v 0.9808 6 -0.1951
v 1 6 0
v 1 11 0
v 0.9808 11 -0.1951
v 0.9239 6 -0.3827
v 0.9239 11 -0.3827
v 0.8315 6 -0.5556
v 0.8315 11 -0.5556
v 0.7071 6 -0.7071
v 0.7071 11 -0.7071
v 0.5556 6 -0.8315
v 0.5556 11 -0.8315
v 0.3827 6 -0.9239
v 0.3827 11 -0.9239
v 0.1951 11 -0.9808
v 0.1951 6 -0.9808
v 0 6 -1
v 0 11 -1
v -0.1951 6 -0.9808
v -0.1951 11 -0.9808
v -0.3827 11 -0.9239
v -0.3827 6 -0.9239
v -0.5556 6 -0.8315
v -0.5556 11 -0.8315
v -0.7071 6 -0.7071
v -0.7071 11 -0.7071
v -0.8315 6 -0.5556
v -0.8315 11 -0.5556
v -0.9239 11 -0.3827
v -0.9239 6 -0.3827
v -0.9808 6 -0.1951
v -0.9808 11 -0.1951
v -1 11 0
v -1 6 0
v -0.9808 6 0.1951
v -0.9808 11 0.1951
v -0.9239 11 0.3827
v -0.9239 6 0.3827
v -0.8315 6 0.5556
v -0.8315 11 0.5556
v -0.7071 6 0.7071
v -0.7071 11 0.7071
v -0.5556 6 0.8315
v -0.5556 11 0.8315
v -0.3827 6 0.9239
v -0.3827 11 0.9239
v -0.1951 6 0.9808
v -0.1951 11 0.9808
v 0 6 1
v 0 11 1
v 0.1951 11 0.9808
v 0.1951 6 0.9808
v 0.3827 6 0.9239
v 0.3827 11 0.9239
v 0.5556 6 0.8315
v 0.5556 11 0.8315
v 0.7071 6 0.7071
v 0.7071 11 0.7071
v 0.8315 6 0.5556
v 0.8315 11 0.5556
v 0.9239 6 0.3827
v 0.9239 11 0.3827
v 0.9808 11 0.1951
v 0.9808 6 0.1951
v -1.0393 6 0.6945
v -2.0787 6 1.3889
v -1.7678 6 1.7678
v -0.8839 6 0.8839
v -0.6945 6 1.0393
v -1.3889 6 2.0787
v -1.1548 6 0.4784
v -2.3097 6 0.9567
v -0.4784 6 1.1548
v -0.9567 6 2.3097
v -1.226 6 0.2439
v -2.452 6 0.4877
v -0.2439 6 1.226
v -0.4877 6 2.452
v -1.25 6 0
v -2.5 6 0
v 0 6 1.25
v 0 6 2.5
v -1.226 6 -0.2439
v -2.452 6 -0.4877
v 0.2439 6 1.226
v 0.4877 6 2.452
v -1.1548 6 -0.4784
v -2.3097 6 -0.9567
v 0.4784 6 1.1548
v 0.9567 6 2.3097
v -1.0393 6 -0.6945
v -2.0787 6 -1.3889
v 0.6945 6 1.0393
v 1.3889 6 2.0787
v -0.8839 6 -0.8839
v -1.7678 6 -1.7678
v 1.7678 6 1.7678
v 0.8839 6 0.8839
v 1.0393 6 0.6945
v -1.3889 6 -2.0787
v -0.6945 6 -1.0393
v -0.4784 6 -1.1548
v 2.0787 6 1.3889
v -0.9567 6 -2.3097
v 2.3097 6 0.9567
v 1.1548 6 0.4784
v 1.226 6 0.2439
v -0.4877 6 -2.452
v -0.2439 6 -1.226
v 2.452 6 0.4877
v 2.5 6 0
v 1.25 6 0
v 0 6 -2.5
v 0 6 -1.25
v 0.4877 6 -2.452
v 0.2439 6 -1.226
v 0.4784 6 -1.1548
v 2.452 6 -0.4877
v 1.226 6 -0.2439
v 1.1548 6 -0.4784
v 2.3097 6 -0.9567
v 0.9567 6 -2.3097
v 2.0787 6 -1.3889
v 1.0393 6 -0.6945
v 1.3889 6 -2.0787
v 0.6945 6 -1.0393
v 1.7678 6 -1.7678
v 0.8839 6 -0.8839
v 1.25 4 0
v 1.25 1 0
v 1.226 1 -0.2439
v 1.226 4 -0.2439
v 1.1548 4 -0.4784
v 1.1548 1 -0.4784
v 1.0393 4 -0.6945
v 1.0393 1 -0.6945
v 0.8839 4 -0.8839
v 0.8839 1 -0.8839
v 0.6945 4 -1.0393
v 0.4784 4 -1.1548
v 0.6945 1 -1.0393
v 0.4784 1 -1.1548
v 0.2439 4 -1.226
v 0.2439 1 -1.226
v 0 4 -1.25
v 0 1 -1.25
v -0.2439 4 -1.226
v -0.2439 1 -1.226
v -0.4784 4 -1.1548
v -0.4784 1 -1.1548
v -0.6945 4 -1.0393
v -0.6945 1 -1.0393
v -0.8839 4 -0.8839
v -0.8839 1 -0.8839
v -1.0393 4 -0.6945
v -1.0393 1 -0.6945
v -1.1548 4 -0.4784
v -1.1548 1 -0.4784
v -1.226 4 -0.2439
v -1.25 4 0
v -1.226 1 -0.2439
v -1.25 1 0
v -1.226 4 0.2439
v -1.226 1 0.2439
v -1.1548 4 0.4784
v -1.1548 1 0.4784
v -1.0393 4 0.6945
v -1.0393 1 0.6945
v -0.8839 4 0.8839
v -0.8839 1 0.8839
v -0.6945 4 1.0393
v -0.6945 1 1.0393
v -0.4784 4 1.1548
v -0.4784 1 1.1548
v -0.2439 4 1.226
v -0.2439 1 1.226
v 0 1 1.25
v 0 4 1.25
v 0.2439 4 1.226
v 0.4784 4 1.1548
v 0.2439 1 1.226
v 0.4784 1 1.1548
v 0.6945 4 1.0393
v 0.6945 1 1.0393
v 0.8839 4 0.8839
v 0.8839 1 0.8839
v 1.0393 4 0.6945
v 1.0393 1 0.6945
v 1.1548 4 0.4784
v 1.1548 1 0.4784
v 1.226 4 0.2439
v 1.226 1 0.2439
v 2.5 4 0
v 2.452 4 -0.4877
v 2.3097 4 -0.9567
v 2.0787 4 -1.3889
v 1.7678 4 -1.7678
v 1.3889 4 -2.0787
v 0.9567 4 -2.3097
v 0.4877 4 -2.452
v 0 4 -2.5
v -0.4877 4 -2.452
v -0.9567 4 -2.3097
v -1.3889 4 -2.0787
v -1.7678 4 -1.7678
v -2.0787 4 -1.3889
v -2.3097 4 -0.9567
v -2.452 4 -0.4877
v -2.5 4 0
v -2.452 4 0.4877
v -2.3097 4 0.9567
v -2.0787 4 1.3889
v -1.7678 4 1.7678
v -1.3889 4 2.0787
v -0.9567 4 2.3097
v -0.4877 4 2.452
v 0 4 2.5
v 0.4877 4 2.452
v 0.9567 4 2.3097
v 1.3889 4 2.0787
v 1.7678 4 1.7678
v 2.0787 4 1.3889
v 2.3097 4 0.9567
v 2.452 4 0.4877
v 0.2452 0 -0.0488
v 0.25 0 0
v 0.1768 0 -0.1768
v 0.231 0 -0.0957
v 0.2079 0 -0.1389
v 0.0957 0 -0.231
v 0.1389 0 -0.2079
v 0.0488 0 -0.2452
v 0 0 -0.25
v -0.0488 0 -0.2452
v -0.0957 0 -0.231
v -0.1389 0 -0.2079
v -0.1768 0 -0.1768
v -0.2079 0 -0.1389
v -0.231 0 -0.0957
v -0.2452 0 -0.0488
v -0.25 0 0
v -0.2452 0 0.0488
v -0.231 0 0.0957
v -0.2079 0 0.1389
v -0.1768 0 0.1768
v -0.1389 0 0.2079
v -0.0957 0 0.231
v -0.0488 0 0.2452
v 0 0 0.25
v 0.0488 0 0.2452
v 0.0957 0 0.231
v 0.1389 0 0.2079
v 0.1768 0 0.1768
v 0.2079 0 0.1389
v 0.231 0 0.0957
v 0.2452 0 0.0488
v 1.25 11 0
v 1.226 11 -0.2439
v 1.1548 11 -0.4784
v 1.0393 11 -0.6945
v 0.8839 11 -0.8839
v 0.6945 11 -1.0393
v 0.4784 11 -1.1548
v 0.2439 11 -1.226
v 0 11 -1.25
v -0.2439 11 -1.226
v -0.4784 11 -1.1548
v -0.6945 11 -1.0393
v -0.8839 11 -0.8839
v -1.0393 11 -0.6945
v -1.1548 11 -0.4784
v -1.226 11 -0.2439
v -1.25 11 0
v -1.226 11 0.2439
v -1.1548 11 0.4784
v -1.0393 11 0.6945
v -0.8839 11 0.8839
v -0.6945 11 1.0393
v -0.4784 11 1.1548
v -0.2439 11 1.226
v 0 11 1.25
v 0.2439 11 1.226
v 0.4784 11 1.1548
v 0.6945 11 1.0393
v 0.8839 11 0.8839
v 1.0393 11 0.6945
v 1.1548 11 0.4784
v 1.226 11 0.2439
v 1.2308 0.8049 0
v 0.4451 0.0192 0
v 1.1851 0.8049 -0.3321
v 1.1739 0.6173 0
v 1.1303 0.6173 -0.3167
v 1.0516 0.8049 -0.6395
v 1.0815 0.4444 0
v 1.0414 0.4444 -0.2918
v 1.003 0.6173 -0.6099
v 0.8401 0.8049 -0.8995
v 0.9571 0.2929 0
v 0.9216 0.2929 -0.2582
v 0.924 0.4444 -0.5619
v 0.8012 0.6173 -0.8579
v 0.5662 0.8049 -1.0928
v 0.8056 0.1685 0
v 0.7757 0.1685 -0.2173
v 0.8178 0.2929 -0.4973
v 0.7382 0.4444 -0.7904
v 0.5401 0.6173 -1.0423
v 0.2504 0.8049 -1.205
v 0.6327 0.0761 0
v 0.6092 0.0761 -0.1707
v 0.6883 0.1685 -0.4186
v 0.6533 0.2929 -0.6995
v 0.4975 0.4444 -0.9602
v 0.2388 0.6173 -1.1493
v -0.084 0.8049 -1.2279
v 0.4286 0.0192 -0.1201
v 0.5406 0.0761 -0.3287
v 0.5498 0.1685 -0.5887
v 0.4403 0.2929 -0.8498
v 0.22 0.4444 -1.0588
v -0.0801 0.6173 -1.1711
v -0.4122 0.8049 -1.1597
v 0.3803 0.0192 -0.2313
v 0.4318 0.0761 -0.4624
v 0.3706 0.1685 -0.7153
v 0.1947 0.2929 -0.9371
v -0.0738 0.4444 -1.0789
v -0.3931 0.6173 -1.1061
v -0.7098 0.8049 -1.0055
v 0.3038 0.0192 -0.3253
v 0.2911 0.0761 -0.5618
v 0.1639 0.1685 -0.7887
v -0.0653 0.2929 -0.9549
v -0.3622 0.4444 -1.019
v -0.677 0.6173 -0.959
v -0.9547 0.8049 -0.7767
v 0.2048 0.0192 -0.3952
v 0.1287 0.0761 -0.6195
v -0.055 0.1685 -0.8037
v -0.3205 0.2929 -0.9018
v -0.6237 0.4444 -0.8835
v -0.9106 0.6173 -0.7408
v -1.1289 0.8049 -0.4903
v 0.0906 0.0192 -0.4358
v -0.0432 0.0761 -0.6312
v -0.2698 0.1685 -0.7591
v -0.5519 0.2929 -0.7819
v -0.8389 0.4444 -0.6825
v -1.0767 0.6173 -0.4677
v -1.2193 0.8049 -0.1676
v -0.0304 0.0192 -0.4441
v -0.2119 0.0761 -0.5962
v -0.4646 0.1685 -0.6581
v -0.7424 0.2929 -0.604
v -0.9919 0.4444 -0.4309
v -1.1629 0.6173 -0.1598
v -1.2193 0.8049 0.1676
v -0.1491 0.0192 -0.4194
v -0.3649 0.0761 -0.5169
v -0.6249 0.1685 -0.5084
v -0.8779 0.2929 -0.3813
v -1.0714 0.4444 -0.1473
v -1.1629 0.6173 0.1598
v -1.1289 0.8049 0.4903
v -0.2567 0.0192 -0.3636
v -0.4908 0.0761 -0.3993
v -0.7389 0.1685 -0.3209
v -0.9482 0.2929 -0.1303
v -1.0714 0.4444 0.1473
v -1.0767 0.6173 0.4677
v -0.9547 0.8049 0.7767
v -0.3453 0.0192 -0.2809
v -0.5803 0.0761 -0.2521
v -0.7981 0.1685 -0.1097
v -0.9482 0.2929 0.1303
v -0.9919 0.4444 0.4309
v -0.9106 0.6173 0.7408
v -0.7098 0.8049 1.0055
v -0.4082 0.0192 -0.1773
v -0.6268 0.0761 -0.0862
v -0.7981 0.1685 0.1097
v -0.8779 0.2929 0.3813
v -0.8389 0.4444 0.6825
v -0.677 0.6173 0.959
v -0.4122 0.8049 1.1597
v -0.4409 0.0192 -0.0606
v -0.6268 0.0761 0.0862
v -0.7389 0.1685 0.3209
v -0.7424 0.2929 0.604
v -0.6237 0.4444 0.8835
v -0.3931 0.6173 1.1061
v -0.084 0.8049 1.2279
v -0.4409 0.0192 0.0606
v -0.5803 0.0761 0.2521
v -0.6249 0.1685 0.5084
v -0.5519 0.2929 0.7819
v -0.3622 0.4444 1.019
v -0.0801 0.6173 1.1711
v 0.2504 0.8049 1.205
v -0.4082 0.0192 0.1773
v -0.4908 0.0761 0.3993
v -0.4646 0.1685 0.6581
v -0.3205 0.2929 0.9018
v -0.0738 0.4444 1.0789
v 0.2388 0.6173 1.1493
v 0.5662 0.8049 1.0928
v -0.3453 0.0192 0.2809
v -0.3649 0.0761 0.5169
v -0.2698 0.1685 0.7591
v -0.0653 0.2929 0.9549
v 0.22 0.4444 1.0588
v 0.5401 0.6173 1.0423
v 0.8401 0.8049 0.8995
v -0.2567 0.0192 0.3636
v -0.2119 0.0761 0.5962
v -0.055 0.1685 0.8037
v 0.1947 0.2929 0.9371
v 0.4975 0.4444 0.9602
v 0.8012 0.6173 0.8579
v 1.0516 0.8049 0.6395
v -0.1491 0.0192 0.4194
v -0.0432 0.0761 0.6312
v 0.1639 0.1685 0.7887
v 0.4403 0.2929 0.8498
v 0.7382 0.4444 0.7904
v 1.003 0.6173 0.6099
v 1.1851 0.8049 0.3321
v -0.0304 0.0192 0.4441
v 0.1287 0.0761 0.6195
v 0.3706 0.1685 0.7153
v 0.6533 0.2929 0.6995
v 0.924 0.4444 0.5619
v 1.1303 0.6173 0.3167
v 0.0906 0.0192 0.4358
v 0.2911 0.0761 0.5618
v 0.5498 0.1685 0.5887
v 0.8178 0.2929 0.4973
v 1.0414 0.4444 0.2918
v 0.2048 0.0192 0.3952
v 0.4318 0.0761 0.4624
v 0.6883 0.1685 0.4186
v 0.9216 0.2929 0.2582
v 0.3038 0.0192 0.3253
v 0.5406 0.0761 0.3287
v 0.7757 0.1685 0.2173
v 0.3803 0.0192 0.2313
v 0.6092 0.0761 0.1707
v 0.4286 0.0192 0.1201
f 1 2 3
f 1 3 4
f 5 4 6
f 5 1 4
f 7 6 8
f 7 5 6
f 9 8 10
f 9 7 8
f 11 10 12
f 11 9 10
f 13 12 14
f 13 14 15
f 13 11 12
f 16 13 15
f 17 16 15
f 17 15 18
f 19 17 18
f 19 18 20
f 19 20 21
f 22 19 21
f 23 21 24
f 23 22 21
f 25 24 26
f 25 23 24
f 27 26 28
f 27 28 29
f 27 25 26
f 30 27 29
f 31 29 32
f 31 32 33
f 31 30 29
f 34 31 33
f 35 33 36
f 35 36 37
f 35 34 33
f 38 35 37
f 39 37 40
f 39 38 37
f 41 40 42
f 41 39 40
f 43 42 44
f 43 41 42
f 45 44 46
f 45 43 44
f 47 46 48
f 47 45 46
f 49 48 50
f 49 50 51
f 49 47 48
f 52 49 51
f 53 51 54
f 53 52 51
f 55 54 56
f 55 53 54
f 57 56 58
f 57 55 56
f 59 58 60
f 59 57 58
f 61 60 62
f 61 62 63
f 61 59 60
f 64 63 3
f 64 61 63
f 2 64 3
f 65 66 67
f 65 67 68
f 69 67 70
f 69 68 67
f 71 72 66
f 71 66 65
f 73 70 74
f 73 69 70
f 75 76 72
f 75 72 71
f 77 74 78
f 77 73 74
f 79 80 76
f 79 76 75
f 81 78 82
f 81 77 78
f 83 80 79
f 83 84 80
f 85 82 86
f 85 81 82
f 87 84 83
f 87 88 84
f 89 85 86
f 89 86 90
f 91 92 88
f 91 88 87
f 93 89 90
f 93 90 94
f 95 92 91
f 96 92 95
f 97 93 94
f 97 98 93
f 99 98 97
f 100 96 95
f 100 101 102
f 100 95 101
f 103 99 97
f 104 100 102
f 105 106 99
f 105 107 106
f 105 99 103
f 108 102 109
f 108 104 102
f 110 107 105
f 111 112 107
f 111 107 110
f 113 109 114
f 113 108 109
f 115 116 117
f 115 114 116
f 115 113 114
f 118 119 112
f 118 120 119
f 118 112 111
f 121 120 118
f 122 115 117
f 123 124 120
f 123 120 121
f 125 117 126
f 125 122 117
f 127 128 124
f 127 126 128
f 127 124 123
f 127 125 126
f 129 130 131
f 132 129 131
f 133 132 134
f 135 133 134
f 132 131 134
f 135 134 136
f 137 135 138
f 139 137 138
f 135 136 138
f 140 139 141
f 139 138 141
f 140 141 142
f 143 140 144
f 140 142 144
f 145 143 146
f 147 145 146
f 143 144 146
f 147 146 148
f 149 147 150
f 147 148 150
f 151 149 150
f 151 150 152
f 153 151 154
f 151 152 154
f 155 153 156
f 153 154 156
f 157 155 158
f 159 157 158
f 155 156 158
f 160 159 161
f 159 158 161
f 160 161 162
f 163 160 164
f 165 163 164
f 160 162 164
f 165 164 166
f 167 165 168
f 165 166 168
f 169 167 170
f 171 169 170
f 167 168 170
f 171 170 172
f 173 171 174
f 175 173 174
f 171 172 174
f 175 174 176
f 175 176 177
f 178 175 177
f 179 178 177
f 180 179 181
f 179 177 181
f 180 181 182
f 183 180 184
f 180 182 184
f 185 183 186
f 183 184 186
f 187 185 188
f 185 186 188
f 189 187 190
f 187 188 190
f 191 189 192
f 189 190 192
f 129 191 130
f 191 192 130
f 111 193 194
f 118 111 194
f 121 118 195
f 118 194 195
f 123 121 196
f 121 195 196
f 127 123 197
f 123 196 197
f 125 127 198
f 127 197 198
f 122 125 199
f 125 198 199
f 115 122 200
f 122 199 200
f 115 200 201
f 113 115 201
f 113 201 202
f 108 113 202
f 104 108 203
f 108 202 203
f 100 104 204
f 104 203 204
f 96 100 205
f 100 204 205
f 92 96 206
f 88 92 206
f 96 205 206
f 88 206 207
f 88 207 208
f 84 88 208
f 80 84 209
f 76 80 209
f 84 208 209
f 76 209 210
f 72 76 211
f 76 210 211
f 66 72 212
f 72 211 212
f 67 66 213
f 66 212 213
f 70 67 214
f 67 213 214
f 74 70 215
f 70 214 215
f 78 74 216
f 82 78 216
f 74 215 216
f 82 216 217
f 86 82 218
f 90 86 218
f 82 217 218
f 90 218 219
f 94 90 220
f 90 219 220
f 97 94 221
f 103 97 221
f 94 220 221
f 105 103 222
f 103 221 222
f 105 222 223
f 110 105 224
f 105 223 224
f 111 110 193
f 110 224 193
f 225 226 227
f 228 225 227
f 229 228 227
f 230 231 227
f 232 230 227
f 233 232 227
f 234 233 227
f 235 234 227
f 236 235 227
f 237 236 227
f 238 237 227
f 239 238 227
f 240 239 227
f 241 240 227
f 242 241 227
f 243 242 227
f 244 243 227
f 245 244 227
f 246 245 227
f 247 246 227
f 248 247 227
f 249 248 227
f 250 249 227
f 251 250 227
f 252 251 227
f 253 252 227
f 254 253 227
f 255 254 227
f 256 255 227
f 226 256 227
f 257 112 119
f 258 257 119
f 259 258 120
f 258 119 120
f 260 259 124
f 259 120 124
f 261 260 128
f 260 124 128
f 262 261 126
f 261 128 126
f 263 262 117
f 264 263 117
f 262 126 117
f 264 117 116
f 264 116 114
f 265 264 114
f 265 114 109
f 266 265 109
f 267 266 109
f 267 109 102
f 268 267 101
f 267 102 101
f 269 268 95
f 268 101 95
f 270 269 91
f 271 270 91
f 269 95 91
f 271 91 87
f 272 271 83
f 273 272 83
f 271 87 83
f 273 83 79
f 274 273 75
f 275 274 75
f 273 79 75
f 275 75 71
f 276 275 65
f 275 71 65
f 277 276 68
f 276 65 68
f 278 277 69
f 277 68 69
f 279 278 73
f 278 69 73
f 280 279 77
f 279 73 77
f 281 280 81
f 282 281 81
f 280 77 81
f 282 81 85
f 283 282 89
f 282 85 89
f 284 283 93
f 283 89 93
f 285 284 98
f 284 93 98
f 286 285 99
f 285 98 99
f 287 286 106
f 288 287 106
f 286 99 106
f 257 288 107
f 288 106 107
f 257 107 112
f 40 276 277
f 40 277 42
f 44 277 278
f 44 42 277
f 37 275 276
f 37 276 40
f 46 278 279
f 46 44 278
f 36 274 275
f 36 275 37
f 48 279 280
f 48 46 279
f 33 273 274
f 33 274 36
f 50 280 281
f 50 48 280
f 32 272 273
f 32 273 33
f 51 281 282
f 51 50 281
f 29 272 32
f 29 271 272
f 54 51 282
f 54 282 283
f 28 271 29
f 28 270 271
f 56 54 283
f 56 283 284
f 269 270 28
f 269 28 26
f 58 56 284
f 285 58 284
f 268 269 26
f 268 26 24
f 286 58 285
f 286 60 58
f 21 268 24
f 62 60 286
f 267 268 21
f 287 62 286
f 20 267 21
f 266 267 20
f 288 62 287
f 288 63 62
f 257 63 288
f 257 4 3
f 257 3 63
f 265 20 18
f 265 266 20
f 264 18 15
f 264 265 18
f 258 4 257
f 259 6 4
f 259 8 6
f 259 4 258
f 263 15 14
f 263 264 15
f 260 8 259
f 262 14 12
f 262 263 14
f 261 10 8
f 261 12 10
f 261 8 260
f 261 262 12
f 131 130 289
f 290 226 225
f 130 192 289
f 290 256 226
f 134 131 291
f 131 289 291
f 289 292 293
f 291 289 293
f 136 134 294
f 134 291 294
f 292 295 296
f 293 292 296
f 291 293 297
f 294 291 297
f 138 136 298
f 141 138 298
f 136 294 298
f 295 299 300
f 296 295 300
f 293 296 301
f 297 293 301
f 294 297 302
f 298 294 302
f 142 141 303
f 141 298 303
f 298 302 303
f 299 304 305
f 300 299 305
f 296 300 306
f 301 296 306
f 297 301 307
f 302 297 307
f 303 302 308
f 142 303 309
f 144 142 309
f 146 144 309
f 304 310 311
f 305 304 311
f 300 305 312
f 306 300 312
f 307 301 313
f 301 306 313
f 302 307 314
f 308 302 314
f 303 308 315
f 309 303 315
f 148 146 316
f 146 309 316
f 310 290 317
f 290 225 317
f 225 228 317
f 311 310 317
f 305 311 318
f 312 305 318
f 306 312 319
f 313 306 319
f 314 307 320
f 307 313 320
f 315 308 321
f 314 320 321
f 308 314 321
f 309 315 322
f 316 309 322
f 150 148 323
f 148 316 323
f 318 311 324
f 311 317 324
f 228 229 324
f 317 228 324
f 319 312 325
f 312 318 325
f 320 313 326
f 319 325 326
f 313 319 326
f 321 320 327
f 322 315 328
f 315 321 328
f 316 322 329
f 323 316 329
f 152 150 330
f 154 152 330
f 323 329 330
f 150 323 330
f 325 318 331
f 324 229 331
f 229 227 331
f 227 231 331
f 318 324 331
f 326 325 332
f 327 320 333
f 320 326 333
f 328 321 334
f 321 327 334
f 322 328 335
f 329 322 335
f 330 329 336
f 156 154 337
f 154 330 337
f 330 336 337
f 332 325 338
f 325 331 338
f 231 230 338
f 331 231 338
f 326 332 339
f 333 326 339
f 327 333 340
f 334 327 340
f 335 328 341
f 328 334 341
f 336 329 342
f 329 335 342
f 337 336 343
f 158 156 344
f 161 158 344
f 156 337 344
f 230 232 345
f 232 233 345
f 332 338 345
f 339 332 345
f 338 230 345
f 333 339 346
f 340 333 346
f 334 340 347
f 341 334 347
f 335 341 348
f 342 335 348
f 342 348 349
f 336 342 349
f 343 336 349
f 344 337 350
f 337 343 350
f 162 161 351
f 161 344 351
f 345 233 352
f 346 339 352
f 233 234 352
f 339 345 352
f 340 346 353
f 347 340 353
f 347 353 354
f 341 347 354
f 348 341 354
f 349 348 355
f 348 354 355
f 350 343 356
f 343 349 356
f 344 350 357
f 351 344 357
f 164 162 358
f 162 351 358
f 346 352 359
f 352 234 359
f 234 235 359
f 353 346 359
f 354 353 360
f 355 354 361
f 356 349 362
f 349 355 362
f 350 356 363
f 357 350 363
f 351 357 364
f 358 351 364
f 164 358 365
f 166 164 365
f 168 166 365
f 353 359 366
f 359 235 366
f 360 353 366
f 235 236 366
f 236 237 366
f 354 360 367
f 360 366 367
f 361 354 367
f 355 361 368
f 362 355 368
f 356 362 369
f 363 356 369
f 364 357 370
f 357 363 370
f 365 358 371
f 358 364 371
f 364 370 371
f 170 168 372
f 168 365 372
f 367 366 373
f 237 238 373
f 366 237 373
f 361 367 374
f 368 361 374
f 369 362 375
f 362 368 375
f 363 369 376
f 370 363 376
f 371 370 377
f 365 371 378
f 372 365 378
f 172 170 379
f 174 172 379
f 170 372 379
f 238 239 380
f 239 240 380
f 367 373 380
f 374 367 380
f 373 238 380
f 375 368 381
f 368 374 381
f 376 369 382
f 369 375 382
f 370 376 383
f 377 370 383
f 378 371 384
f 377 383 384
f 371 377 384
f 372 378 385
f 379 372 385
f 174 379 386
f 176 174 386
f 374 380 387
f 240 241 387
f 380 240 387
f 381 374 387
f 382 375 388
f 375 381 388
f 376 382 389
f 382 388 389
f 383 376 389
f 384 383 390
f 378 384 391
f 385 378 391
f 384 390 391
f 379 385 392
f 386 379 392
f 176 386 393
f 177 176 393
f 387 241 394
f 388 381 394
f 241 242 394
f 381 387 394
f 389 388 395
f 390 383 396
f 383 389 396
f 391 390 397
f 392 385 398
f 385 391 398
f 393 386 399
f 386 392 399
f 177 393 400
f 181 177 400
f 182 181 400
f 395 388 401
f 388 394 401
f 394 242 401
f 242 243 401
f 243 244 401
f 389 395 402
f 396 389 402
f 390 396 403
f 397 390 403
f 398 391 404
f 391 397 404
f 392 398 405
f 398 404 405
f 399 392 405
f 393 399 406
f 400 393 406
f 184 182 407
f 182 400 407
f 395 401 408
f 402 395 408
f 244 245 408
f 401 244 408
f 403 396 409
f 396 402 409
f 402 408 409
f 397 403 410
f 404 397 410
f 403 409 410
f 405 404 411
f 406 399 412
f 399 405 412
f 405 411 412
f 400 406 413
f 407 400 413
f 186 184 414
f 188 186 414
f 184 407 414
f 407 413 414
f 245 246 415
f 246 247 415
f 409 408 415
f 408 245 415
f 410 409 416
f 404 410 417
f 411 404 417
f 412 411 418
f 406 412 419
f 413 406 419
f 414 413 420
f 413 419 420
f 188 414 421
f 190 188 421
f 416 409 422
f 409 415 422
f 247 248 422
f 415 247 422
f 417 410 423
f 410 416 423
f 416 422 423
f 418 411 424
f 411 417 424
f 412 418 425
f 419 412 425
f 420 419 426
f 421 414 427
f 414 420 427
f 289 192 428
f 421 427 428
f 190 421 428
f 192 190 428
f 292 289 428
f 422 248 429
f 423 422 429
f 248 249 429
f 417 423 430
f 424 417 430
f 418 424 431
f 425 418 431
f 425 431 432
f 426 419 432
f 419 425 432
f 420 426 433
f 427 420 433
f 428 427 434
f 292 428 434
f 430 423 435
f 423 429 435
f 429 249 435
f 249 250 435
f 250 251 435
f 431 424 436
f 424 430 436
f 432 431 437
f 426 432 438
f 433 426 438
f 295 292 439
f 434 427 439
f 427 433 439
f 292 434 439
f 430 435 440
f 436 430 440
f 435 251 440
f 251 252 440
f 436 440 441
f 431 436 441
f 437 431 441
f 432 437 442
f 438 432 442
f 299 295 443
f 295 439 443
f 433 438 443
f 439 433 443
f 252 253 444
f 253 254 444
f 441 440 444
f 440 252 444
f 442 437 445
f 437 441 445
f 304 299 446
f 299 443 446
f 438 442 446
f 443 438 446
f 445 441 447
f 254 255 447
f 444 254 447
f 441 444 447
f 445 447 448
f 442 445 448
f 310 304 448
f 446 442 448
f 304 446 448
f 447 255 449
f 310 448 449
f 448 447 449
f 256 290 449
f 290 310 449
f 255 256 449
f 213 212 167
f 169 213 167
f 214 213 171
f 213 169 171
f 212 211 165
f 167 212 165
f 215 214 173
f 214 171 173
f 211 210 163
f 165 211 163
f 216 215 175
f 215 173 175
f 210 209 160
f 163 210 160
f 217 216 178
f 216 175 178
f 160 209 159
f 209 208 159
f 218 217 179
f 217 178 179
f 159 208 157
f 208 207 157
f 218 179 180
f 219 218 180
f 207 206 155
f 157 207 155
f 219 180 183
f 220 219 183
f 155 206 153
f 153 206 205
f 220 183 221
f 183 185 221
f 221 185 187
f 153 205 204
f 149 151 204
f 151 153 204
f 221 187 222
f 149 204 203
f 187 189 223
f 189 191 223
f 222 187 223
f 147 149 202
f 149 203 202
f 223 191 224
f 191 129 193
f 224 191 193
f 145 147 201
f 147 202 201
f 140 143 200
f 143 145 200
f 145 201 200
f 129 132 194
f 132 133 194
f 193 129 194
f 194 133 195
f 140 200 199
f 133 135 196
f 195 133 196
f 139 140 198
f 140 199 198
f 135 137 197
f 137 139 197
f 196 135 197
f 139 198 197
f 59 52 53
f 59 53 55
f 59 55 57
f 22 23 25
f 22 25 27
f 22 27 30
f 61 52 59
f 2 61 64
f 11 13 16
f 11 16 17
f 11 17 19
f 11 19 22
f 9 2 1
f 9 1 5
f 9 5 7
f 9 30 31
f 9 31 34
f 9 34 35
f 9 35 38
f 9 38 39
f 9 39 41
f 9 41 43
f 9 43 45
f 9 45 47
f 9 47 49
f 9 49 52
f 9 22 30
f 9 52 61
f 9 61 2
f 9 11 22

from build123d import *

# Parameters (mm, degrees)
SKETCH1_R           = 1.25
BOSS_EXTRUDE1_DEPTH = 4
SKETCH2_R           = 2.5
BOSS_EXTRUDE2_DEPTH = 2
SKETCH3_R           = 1.25
SKETCH3_R_2         = 1
BOSS_EXTRUDE3_DEPTH = 5
FILLET1_R           = 1


with BuildPart() as part:
    # Sketch1 → Boss-Extrude1 (new body)
    with BuildSketch(Plane(origin=(0, 0, 0), x_dir=(1, 0, 0), z_dir=(0, 1, 0))):
        Circle(SKETCH1_R)
    extrude(amount=BOSS_EXTRUDE1_DEPTH)

    # Sketch2 → Boss-Extrude2 (add)
    with BuildSketch(Plane(origin=(0, 4, 0), x_dir=(1, 0, 0), z_dir=(0, 1, 0))):
        Circle(SKETCH2_R)
    extrude(amount=BOSS_EXTRUDE2_DEPTH)

    # Sketch3 → Boss-Extrude3 (add)
    with BuildSketch(Plane(origin=(0, 6, 0), x_dir=(1, 0, 0), z_dir=(0, 1, 0))):
        Circle(SKETCH3_R)
        Circle(SKETCH3_R_2, mode=Mode.SUBTRACT)
    extrude(amount=BOSS_EXTRUDE3_DEPTH)

    # Fillet1
    fillet1_edges = [part.edges().sort_by_distance(p)[0] for p in [
        (-1.25, 0, 0),
    ]]
    fillet(fillet1_edges, radius=FILLET1_R)


solid = part.part
